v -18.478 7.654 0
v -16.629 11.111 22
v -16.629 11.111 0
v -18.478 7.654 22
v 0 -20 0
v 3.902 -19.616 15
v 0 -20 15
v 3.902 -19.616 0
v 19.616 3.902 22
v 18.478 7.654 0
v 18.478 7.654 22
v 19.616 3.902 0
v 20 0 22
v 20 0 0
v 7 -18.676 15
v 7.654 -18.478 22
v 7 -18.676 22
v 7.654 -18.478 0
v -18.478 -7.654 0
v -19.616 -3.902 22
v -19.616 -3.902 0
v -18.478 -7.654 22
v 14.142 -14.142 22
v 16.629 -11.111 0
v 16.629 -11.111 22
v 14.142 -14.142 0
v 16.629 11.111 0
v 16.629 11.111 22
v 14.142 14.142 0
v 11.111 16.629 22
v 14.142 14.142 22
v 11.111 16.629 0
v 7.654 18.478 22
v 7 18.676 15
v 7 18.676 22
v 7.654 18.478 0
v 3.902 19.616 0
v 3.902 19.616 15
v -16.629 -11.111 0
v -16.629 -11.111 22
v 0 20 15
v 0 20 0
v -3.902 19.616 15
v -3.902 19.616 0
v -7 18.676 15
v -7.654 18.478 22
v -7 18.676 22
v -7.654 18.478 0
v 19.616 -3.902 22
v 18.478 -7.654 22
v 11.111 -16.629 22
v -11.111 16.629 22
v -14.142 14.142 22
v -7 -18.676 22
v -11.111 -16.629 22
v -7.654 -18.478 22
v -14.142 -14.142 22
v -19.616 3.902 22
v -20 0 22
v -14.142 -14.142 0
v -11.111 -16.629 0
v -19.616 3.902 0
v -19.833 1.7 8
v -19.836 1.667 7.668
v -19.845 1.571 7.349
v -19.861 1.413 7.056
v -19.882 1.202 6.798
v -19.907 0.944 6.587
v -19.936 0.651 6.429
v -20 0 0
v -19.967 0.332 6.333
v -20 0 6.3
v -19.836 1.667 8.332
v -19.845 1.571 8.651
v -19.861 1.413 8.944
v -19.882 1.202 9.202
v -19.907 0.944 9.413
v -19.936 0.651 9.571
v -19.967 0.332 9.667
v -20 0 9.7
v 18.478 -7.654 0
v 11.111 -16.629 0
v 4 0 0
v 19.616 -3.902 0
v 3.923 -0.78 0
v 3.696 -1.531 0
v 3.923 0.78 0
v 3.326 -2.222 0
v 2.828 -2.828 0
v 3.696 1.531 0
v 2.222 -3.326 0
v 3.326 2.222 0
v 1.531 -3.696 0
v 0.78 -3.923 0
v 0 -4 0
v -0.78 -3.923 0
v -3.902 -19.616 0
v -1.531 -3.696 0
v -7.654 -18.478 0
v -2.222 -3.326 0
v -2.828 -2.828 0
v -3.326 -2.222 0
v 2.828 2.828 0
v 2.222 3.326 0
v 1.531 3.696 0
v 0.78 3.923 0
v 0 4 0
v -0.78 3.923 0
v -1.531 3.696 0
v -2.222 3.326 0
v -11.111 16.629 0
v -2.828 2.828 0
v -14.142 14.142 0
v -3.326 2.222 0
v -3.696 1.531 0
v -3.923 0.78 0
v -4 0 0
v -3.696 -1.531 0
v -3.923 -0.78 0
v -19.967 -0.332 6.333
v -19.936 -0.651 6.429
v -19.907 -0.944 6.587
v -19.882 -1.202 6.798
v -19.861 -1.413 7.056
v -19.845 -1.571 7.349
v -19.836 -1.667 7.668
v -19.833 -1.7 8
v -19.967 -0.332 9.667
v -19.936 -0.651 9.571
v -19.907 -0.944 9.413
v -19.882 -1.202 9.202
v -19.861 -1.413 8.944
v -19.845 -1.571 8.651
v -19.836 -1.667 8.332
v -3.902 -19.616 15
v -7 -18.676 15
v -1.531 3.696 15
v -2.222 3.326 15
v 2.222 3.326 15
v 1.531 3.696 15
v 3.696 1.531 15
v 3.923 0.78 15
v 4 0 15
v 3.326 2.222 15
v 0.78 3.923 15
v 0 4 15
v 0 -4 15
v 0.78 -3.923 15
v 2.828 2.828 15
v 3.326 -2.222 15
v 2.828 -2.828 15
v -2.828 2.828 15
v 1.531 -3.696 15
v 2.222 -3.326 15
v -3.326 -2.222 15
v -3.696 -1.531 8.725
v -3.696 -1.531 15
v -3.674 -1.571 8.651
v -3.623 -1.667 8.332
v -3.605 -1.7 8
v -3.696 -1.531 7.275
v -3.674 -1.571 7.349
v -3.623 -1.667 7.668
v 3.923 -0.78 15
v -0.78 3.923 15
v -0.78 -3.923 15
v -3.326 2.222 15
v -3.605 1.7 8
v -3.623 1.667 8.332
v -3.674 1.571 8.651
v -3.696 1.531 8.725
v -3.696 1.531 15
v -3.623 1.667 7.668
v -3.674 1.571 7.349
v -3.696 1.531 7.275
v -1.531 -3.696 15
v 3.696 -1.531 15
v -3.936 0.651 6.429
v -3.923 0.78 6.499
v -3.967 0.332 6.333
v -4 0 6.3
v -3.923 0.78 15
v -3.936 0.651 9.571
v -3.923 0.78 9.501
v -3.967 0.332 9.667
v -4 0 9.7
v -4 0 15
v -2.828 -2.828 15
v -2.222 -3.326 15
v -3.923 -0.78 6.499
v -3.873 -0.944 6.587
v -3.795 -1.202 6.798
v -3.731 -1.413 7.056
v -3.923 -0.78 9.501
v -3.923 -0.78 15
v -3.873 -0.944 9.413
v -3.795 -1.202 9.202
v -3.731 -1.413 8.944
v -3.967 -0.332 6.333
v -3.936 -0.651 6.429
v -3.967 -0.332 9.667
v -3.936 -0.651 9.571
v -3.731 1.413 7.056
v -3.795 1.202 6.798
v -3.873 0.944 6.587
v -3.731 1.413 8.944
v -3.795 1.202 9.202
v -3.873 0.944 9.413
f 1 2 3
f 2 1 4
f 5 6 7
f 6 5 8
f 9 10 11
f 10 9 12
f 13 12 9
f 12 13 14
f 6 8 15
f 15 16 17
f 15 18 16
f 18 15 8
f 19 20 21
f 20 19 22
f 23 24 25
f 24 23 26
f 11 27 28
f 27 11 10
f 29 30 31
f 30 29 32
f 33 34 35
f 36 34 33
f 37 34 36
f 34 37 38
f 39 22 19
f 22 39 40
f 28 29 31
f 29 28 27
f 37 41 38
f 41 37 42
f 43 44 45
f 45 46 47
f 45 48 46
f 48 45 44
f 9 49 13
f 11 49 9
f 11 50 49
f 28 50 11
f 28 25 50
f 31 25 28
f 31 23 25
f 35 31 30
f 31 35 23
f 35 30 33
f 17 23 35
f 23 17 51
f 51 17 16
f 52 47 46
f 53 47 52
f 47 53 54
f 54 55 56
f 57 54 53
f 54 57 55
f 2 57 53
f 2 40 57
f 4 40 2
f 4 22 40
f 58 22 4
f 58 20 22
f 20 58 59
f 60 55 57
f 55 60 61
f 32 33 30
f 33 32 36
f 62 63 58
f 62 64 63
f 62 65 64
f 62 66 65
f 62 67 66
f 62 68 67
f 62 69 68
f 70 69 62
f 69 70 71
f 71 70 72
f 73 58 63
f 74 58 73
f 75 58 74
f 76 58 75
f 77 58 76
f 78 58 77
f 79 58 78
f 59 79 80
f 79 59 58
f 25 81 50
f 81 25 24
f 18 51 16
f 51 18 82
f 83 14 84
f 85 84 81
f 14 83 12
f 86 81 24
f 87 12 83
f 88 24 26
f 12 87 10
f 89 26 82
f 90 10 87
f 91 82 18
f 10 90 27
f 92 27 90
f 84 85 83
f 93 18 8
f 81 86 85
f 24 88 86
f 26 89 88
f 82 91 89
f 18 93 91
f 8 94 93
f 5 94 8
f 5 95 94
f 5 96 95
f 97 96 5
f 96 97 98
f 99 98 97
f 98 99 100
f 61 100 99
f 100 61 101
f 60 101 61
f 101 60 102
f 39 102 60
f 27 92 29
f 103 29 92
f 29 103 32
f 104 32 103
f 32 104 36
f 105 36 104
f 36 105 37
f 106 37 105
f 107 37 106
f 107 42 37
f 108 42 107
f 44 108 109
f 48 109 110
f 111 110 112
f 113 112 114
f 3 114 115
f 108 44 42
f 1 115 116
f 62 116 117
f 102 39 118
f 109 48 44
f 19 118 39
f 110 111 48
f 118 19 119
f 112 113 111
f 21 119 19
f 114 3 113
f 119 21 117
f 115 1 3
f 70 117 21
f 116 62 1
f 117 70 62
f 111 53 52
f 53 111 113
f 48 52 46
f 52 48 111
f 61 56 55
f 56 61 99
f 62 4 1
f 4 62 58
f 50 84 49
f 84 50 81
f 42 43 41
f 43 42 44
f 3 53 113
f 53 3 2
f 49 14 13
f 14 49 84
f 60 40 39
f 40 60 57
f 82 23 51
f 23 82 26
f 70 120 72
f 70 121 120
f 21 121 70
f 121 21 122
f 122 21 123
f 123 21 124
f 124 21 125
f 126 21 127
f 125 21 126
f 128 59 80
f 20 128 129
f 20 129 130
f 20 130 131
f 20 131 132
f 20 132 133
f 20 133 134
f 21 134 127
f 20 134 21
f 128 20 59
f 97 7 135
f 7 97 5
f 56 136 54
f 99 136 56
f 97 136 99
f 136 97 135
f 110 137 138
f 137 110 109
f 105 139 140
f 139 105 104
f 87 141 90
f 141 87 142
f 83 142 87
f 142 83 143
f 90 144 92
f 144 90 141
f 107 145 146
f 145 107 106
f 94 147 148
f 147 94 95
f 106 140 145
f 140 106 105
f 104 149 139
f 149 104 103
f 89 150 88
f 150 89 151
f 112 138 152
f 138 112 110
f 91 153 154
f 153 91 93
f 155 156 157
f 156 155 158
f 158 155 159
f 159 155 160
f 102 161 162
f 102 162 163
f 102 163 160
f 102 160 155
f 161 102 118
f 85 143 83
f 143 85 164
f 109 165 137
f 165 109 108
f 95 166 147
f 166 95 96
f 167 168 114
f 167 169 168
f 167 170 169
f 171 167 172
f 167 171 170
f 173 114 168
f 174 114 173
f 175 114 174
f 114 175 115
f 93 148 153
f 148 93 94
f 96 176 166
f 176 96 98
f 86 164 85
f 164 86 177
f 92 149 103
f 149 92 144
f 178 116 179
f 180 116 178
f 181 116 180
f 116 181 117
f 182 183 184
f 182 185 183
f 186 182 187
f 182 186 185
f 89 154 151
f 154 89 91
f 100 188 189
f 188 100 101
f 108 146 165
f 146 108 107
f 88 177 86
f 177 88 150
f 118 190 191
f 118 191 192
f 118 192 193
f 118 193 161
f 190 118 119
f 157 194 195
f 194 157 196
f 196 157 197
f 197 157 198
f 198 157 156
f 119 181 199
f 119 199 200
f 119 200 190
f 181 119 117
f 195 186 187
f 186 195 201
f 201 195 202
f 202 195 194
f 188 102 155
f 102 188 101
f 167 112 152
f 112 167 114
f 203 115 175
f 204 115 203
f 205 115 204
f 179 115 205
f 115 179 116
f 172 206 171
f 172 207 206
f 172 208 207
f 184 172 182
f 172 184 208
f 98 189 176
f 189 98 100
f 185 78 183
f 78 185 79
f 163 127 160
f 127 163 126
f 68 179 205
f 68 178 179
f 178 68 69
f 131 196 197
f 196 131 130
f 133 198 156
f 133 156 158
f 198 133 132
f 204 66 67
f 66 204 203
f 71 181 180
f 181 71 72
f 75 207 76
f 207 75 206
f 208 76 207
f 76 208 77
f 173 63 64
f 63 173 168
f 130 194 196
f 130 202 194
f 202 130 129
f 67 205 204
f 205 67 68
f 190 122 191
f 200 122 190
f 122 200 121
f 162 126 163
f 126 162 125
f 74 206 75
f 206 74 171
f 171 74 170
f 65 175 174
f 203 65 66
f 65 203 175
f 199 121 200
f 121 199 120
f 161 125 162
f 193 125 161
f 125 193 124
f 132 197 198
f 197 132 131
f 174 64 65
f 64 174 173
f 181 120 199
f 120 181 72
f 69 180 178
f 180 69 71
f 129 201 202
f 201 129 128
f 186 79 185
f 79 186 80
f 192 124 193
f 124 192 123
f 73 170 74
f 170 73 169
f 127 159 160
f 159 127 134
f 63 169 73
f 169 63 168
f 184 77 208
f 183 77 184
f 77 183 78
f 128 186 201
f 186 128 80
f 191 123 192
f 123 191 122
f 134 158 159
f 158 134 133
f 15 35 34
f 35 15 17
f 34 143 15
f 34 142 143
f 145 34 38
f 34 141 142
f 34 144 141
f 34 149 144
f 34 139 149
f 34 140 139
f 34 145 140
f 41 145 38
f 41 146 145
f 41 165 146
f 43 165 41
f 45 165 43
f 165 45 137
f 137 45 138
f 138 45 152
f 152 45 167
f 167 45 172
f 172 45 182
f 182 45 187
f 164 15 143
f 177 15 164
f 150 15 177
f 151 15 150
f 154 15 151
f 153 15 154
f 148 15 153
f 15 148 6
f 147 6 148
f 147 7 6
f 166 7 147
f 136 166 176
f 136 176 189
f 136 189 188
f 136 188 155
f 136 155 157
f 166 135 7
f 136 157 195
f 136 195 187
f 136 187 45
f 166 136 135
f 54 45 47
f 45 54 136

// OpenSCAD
$fn = 32;

// ----------------------------------------------------------------------
// Oldham coupling hub: 40 x 22 mm
// ----------------------------------------------------------------------

// --- parameters (mm) ---
body_d = 40;              // hub diameter
body_l = 16;              // hub length
shaft_d = 8;              // shaft bore
cam_w = 14;               // drive tongue width
tongue_h = 6;             // drive tongue height
set_d = 3.4;              // set screw tap hole

module hub() {
  /* the slot side is a raised disc with a groove milled across it */
  cylinder(h = body_l + tongue_h, d = body_d);
}

difference() {
  hub();
  translate([0, 0, -1]) cylinder(h = body_l + tongue_h + 2, d = shaft_d);
  translate([-body_d / 2 - 1, 0, body_l * 0.5])
    rotate([0, 90, 0]) cylinder(h = body_d / 2 + 2, d = set_d);
  translate([-cam_w / 2, -body_d / 2 - 1, body_l - 1])
    cube([cam_w, body_d + 2, tongue_h + 1]);
}
